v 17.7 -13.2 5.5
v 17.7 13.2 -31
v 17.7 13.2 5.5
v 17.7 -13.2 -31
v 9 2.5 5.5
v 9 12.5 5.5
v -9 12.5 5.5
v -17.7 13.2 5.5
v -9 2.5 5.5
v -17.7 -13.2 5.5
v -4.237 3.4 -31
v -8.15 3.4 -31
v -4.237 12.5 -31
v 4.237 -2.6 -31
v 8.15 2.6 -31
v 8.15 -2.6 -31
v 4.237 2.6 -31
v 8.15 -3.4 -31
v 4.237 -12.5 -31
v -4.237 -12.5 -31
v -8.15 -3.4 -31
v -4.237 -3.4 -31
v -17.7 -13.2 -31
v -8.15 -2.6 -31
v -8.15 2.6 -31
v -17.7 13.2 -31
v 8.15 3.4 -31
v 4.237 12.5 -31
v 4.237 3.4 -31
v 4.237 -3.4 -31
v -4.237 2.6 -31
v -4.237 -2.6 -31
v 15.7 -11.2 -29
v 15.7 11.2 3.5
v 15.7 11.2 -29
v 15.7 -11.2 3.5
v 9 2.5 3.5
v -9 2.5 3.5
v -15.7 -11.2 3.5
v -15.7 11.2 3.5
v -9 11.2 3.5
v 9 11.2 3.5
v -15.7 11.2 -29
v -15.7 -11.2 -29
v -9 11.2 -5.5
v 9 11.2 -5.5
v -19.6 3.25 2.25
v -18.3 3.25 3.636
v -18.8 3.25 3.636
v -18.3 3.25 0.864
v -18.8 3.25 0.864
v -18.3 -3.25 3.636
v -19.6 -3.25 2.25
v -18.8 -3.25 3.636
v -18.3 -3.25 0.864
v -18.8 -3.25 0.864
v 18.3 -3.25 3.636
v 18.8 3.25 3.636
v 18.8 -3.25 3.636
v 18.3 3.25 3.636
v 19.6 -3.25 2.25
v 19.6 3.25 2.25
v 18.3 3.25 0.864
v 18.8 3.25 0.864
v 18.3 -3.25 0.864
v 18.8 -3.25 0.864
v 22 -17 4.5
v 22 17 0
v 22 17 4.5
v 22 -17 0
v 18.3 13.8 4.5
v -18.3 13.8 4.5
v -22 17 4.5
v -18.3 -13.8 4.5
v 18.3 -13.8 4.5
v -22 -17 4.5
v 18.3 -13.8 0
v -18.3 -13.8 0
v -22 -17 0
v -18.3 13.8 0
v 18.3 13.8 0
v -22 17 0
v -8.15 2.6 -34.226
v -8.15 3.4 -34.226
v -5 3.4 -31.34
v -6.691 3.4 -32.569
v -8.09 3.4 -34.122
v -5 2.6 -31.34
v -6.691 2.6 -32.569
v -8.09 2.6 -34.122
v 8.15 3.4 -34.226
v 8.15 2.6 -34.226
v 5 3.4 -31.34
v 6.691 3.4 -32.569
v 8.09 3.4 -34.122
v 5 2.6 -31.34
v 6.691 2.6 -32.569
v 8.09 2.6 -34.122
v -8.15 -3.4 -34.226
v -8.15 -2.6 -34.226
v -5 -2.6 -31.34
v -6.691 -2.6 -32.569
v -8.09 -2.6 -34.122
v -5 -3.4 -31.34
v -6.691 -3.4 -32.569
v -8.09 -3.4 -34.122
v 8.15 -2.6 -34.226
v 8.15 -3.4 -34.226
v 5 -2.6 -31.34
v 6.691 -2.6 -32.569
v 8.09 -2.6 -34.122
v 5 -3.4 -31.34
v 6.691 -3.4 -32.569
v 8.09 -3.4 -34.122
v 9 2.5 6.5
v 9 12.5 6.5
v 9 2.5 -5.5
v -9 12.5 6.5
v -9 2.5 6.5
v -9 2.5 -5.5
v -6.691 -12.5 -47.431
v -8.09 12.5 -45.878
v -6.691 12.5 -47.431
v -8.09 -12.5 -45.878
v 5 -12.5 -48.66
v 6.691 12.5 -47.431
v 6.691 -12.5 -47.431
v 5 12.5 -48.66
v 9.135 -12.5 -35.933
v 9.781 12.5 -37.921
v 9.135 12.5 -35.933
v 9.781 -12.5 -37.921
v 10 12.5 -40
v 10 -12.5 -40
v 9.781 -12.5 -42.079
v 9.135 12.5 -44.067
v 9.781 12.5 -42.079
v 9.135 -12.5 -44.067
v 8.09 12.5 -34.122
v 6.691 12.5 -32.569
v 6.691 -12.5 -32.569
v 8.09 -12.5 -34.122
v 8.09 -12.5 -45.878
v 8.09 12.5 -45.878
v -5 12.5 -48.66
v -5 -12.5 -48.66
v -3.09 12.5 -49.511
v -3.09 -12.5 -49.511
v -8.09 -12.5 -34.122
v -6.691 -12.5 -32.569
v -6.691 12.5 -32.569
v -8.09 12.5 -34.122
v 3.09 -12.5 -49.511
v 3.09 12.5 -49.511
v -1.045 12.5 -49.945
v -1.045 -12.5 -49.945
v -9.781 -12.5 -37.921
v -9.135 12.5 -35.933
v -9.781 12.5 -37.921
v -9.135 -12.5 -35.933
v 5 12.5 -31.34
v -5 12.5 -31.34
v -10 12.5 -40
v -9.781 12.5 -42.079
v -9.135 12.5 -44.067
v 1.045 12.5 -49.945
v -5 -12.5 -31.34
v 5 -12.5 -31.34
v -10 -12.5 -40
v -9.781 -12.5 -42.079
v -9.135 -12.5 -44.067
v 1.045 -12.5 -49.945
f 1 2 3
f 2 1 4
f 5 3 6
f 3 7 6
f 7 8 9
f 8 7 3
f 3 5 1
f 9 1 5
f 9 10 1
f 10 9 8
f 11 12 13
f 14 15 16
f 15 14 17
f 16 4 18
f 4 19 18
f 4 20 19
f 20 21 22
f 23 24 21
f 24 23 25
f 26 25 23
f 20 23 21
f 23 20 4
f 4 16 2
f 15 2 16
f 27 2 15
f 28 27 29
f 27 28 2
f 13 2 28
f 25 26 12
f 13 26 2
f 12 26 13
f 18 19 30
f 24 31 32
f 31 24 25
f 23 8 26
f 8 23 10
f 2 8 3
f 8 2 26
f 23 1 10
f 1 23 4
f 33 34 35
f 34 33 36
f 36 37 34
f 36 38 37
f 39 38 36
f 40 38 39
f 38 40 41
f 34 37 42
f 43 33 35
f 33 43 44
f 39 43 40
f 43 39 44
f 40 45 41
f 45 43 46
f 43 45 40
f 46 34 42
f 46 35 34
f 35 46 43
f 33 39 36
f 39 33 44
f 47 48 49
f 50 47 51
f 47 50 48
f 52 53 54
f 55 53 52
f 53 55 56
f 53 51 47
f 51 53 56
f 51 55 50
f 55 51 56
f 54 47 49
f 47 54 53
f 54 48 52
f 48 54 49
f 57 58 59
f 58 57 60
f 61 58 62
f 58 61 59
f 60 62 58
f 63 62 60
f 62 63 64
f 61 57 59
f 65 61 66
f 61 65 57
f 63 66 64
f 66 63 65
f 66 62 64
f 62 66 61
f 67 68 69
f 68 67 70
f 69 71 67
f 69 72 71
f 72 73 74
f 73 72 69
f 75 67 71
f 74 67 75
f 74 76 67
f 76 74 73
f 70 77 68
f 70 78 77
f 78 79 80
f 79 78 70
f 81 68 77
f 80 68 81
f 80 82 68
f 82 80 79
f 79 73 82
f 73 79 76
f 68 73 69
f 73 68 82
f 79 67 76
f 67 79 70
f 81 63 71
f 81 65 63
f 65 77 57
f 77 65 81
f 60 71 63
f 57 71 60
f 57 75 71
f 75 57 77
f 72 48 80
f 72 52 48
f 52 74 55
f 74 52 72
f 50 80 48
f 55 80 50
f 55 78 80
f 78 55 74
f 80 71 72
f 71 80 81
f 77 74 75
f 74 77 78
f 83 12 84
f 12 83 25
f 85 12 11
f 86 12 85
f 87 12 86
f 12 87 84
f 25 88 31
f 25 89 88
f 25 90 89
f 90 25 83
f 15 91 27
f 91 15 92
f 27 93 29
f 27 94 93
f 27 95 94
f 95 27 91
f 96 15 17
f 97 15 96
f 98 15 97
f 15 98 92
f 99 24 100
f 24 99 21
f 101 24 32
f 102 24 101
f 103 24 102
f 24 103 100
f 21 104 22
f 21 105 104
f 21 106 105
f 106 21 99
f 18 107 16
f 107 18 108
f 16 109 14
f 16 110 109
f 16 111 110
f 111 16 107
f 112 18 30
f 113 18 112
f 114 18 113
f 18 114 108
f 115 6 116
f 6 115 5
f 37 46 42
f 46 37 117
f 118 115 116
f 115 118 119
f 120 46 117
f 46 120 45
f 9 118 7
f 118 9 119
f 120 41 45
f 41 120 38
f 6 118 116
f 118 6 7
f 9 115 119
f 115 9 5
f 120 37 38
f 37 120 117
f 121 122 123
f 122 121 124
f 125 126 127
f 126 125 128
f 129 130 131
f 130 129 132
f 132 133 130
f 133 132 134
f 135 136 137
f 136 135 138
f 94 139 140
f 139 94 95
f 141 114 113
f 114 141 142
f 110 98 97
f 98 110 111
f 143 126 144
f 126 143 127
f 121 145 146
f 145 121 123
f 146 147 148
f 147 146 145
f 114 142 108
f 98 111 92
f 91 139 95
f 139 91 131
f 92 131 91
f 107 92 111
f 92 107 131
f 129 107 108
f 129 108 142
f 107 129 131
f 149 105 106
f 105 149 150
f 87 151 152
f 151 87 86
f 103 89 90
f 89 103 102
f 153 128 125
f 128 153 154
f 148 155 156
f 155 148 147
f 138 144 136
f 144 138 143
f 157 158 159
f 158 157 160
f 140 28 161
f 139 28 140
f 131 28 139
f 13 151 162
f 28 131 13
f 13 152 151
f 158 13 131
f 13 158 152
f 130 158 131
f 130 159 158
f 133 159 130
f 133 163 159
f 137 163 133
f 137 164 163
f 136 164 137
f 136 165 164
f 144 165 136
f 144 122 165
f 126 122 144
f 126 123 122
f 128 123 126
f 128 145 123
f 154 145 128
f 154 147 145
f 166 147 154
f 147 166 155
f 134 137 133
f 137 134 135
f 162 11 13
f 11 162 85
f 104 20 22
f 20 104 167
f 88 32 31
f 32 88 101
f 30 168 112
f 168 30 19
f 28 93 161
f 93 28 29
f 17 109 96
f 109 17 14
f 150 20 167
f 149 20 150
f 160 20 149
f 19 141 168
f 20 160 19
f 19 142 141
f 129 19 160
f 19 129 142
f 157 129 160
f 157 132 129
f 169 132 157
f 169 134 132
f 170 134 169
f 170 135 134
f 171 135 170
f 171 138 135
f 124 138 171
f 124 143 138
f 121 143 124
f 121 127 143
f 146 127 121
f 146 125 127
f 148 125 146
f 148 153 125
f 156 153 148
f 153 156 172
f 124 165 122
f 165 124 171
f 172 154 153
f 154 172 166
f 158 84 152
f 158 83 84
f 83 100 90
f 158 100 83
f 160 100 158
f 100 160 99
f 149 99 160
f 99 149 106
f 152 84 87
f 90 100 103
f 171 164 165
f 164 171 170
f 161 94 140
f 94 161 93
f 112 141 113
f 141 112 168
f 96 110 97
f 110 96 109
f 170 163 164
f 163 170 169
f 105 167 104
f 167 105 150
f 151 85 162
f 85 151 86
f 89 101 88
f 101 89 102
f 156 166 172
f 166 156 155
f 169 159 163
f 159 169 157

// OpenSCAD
// Parameters
cutout_width_mm = 36.0; //[18.0:72.0:0.5]
cutout_height_mm = 27.0; //[13.5:54.0:0.5]
cutout_corner_radius_mm = 0.0; //[0.0:4.0:0.25]
panel_thickness_mm = 2.0; //[1.0:3.0:0.25]
fit_clearance_mm = 0.3; //[0.0:1.0:0.05]
overlap_mm = 1.0; //[0.5:2.0:0.1]
flange_width_mm = 44.0; //[36.0:88.0:0.5]
flange_height_mm = 34.0; //[27.0:68.0:0.5]
flange_thickness_mm = 3.0; //[1.5:6.0:0.25]
bezel_thickness_mm = 1.5; //[0.8:4.0:0.1]
body_depth_mm = 30.0; //[15.0:60.0:0.5]
body_wall_mm = 2.0; //[1.0:4.0:0.25]
front_face_recess_mm = 1.0; //[0.0:3.0:0.25]
mounting_method_variant = 1; //[0:1:1]
screw_hole_diameter_mm = 3.2; //[2.0:6.0:0.1]
screw_hole_pitch_x_mm = 36.0; //[20.0:60.0:0.5]
screw_hole_pitch_y_mm = 0.0; //[0.0:30.0:0.5]
fuse_drawer_width_mm = 18.0; //[12.0:30.0:0.5]
fuse_drawer_height_mm = 10.0; //[6.0:18.0:0.5]
fuse_drawer_depth_mm = 12.0; //[6.0:25.0:0.5]
spade_width_mm = 6.3; //[4.8:9.5:0.1]
spade_thickness_mm = 0.8; //[0.5:1.5:0.05]
spade_length_mm = 12.0; //[6.0:25.0:0.5]
spade_pitch_x_mm = 10.0; //[6.0:16.0:0.5]
spade_pitch_y_mm = 6.0; //[0.0:12.0:0.5]
strain_relief_clearance_radius_mm = 10.0; //[5.0:20.0:0.5]
strain_relief_clearance_length_mm = 25.0; //[10.0:60.0:0.5]

// ---------- Derived placement helpers (keeps everything connected) ----------
body_total_z_mm = body_depth_mm + panel_thickness_mm + flange_thickness_mm + bezel_thickness_mm;

// Keep the original body Z-centering logic, but reuse it consistently
body_center_z_mm = -(body_depth_mm - (flange_thickness_mm + bezel_thickness_mm)) / 2;

// Body extents
body_front_z_mm = body_center_z_mm + body_total_z_mm/2;
body_back_z_mm  = body_center_z_mm - body_total_z_mm/2;

// Flange extents (as modeled)
flange_total_z_mm = flange_thickness_mm + bezel_thickness_mm;
flange_center_z_mm = flange_total_z_mm/2;
flange_back_z_mm = flange_center_z_mm - flange_total_z_mm/2;

// ---------- IEC Inlet Body ----------
module iec() {
  color("Black")
  difference() {
    // Outer body
    translate([0, 0, body_center_z_mm])
      cube([cutout_width_mm - 2 * fit_clearance_mm,
            cutout_height_mm - 2 * fit_clearance_mm,
            body_total_z_mm], center=true);

    // Inner void
    translate([0, 0, body_center_z_mm])
      cube([cutout_width_mm - 2 * fit_clearance_mm - 2 * body_wall_mm,
            cutout_height_mm - 2 * fit_clearance_mm - 2 * body_wall_mm,
            body_total_z_mm - 2 * body_wall_mm], center=true);
  }
}

// ---------- Front Flange Bezel ----------
module front_flange_bezel() {
  color("Silver")
  difference() {
    // Outer flange
    translate([0, 0, flange_center_z_mm])
      cube([flange_width_mm, flange_height_mm, flange_total_z_mm], center=true);

    // Opening
    translate([0, 0, flange_center_z_mm])
      cube([cutout_width_mm + 2 * fit_clearance_mm,
            cutout_height_mm + 2 * fit_clearance_mm,
            flange_total_z_mm + 2 * overlap_mm], center=true);

    // Screw holes
    if (mounting_method_variant == 1) {
      translate([-screw_hole_pitch_x_mm / 2, screw_hole_pitch_y_mm / 2, flange_center_z_mm])
        rotate([90, 0, 0])
        cylinder(r=screw_hole_diameter_mm / 2, h=flange_total_z_mm + 2 * overlap_mm, center=true);

      translate([screw_hole_pitch_x_mm / 2, -screw_hole_pitch_y_mm / 2, flange_center_z_mm])
        rotate([90, 0, 0])
        cylinder(r=screw_hole_diameter_mm / 2, h=flange_total_z_mm + 2 * overlap_mm, center=true);
    }
  }
}

// ---------- Fuse Drawer Housing (ensure it intersects the body) ----------
module fuse_drawer_housing() {
  // Place it near the top inside the cutout, and push slightly into the body front
  fuse_y_mm = (cutout_height_mm/2 - fuse_drawer_height_mm/2 - overlap_mm);
  fuse_z_mm = body_front_z_mm - fuse_drawer_depth_mm/2 + overlap_mm; // intersects body by overlap_mm

  color("DimGray")
    translate([0, fuse_y_mm, fuse_z_mm])
      cube([fuse_drawer_width_mm, fuse_drawer_height_mm, fuse_drawer_depth_mm], center=true);
}

// ---------- Rear Terminal Spades (ensure they intersect the body back) ----------
module rear_terminal_spades() {
  spade_z_mm = body_back_z_mm - spade_length_mm/2 + overlap_mm; // intersects body by overlap_mm

  color("Silver") {
    translate([-spade_pitch_x_mm / 2,  spade_pitch_y_mm / 2, spade_z_mm])
      cube([spade_width_mm, spade_thickness_mm, spade_length_mm], center=true);
    translate([ spade_pitch_x_mm / 2,  spade_pitch_y_mm / 2, spade_z_mm])
      cube([spade_width_mm, spade_thickness_mm, spade_length_mm], center=true);
    translate([-spade_pitch_x_mm / 2, -spade_pitch_y_mm / 2, spade_z_mm])
      cube([spade_width_mm, spade_thickness_mm, spade_length_mm], center=true);
    translate([ spade_pitch_x_mm / 2, -spade_pitch_y_mm / 2, spade_z_mm])
      cube([spade_width_mm, spade_thickness_mm, spade_length_mm], center=true);
  }
}

// ---------- Strain Relief Clearance (FIX: attach cylinder to body; no floating) ----------
module strain_relief_clearance() {
  // The original cylinder was floating because it was translated too far back.
  // Attach it to the rear face of the body with a guaranteed overlap.
  // Cylinder axis is along Y due to rotate([90,0,0]); its "thickness" in Z is 2*r.
  // Ensure Z overlap by placing its center at (body_back_z - r + overlap).
  cyl_center_z_mm = body_back_z_mm - strain_relief_clearance_radius_mm + overlap_mm;

  color("Black")
    translate([0, 0, cyl_center_z_mm])
      rotate([90, 0, 0])
        cylinder(r=strain_relief_clearance_radius_mm,
                 h=strain_relief_clearance_length_mm,
                 center=true);
}

// ---------- Assembly (single connected solid) ----------
module assembly() {
  union() {
    iec();
    // Ensure flange intersects body slightly (they already overlap in Z, but keep union explicit)
    front_flange_bezel();
    fuse_drawer_housing();
    rear_terminal_spades();
    strain_relief_clearance();
  }
}

assembly();
